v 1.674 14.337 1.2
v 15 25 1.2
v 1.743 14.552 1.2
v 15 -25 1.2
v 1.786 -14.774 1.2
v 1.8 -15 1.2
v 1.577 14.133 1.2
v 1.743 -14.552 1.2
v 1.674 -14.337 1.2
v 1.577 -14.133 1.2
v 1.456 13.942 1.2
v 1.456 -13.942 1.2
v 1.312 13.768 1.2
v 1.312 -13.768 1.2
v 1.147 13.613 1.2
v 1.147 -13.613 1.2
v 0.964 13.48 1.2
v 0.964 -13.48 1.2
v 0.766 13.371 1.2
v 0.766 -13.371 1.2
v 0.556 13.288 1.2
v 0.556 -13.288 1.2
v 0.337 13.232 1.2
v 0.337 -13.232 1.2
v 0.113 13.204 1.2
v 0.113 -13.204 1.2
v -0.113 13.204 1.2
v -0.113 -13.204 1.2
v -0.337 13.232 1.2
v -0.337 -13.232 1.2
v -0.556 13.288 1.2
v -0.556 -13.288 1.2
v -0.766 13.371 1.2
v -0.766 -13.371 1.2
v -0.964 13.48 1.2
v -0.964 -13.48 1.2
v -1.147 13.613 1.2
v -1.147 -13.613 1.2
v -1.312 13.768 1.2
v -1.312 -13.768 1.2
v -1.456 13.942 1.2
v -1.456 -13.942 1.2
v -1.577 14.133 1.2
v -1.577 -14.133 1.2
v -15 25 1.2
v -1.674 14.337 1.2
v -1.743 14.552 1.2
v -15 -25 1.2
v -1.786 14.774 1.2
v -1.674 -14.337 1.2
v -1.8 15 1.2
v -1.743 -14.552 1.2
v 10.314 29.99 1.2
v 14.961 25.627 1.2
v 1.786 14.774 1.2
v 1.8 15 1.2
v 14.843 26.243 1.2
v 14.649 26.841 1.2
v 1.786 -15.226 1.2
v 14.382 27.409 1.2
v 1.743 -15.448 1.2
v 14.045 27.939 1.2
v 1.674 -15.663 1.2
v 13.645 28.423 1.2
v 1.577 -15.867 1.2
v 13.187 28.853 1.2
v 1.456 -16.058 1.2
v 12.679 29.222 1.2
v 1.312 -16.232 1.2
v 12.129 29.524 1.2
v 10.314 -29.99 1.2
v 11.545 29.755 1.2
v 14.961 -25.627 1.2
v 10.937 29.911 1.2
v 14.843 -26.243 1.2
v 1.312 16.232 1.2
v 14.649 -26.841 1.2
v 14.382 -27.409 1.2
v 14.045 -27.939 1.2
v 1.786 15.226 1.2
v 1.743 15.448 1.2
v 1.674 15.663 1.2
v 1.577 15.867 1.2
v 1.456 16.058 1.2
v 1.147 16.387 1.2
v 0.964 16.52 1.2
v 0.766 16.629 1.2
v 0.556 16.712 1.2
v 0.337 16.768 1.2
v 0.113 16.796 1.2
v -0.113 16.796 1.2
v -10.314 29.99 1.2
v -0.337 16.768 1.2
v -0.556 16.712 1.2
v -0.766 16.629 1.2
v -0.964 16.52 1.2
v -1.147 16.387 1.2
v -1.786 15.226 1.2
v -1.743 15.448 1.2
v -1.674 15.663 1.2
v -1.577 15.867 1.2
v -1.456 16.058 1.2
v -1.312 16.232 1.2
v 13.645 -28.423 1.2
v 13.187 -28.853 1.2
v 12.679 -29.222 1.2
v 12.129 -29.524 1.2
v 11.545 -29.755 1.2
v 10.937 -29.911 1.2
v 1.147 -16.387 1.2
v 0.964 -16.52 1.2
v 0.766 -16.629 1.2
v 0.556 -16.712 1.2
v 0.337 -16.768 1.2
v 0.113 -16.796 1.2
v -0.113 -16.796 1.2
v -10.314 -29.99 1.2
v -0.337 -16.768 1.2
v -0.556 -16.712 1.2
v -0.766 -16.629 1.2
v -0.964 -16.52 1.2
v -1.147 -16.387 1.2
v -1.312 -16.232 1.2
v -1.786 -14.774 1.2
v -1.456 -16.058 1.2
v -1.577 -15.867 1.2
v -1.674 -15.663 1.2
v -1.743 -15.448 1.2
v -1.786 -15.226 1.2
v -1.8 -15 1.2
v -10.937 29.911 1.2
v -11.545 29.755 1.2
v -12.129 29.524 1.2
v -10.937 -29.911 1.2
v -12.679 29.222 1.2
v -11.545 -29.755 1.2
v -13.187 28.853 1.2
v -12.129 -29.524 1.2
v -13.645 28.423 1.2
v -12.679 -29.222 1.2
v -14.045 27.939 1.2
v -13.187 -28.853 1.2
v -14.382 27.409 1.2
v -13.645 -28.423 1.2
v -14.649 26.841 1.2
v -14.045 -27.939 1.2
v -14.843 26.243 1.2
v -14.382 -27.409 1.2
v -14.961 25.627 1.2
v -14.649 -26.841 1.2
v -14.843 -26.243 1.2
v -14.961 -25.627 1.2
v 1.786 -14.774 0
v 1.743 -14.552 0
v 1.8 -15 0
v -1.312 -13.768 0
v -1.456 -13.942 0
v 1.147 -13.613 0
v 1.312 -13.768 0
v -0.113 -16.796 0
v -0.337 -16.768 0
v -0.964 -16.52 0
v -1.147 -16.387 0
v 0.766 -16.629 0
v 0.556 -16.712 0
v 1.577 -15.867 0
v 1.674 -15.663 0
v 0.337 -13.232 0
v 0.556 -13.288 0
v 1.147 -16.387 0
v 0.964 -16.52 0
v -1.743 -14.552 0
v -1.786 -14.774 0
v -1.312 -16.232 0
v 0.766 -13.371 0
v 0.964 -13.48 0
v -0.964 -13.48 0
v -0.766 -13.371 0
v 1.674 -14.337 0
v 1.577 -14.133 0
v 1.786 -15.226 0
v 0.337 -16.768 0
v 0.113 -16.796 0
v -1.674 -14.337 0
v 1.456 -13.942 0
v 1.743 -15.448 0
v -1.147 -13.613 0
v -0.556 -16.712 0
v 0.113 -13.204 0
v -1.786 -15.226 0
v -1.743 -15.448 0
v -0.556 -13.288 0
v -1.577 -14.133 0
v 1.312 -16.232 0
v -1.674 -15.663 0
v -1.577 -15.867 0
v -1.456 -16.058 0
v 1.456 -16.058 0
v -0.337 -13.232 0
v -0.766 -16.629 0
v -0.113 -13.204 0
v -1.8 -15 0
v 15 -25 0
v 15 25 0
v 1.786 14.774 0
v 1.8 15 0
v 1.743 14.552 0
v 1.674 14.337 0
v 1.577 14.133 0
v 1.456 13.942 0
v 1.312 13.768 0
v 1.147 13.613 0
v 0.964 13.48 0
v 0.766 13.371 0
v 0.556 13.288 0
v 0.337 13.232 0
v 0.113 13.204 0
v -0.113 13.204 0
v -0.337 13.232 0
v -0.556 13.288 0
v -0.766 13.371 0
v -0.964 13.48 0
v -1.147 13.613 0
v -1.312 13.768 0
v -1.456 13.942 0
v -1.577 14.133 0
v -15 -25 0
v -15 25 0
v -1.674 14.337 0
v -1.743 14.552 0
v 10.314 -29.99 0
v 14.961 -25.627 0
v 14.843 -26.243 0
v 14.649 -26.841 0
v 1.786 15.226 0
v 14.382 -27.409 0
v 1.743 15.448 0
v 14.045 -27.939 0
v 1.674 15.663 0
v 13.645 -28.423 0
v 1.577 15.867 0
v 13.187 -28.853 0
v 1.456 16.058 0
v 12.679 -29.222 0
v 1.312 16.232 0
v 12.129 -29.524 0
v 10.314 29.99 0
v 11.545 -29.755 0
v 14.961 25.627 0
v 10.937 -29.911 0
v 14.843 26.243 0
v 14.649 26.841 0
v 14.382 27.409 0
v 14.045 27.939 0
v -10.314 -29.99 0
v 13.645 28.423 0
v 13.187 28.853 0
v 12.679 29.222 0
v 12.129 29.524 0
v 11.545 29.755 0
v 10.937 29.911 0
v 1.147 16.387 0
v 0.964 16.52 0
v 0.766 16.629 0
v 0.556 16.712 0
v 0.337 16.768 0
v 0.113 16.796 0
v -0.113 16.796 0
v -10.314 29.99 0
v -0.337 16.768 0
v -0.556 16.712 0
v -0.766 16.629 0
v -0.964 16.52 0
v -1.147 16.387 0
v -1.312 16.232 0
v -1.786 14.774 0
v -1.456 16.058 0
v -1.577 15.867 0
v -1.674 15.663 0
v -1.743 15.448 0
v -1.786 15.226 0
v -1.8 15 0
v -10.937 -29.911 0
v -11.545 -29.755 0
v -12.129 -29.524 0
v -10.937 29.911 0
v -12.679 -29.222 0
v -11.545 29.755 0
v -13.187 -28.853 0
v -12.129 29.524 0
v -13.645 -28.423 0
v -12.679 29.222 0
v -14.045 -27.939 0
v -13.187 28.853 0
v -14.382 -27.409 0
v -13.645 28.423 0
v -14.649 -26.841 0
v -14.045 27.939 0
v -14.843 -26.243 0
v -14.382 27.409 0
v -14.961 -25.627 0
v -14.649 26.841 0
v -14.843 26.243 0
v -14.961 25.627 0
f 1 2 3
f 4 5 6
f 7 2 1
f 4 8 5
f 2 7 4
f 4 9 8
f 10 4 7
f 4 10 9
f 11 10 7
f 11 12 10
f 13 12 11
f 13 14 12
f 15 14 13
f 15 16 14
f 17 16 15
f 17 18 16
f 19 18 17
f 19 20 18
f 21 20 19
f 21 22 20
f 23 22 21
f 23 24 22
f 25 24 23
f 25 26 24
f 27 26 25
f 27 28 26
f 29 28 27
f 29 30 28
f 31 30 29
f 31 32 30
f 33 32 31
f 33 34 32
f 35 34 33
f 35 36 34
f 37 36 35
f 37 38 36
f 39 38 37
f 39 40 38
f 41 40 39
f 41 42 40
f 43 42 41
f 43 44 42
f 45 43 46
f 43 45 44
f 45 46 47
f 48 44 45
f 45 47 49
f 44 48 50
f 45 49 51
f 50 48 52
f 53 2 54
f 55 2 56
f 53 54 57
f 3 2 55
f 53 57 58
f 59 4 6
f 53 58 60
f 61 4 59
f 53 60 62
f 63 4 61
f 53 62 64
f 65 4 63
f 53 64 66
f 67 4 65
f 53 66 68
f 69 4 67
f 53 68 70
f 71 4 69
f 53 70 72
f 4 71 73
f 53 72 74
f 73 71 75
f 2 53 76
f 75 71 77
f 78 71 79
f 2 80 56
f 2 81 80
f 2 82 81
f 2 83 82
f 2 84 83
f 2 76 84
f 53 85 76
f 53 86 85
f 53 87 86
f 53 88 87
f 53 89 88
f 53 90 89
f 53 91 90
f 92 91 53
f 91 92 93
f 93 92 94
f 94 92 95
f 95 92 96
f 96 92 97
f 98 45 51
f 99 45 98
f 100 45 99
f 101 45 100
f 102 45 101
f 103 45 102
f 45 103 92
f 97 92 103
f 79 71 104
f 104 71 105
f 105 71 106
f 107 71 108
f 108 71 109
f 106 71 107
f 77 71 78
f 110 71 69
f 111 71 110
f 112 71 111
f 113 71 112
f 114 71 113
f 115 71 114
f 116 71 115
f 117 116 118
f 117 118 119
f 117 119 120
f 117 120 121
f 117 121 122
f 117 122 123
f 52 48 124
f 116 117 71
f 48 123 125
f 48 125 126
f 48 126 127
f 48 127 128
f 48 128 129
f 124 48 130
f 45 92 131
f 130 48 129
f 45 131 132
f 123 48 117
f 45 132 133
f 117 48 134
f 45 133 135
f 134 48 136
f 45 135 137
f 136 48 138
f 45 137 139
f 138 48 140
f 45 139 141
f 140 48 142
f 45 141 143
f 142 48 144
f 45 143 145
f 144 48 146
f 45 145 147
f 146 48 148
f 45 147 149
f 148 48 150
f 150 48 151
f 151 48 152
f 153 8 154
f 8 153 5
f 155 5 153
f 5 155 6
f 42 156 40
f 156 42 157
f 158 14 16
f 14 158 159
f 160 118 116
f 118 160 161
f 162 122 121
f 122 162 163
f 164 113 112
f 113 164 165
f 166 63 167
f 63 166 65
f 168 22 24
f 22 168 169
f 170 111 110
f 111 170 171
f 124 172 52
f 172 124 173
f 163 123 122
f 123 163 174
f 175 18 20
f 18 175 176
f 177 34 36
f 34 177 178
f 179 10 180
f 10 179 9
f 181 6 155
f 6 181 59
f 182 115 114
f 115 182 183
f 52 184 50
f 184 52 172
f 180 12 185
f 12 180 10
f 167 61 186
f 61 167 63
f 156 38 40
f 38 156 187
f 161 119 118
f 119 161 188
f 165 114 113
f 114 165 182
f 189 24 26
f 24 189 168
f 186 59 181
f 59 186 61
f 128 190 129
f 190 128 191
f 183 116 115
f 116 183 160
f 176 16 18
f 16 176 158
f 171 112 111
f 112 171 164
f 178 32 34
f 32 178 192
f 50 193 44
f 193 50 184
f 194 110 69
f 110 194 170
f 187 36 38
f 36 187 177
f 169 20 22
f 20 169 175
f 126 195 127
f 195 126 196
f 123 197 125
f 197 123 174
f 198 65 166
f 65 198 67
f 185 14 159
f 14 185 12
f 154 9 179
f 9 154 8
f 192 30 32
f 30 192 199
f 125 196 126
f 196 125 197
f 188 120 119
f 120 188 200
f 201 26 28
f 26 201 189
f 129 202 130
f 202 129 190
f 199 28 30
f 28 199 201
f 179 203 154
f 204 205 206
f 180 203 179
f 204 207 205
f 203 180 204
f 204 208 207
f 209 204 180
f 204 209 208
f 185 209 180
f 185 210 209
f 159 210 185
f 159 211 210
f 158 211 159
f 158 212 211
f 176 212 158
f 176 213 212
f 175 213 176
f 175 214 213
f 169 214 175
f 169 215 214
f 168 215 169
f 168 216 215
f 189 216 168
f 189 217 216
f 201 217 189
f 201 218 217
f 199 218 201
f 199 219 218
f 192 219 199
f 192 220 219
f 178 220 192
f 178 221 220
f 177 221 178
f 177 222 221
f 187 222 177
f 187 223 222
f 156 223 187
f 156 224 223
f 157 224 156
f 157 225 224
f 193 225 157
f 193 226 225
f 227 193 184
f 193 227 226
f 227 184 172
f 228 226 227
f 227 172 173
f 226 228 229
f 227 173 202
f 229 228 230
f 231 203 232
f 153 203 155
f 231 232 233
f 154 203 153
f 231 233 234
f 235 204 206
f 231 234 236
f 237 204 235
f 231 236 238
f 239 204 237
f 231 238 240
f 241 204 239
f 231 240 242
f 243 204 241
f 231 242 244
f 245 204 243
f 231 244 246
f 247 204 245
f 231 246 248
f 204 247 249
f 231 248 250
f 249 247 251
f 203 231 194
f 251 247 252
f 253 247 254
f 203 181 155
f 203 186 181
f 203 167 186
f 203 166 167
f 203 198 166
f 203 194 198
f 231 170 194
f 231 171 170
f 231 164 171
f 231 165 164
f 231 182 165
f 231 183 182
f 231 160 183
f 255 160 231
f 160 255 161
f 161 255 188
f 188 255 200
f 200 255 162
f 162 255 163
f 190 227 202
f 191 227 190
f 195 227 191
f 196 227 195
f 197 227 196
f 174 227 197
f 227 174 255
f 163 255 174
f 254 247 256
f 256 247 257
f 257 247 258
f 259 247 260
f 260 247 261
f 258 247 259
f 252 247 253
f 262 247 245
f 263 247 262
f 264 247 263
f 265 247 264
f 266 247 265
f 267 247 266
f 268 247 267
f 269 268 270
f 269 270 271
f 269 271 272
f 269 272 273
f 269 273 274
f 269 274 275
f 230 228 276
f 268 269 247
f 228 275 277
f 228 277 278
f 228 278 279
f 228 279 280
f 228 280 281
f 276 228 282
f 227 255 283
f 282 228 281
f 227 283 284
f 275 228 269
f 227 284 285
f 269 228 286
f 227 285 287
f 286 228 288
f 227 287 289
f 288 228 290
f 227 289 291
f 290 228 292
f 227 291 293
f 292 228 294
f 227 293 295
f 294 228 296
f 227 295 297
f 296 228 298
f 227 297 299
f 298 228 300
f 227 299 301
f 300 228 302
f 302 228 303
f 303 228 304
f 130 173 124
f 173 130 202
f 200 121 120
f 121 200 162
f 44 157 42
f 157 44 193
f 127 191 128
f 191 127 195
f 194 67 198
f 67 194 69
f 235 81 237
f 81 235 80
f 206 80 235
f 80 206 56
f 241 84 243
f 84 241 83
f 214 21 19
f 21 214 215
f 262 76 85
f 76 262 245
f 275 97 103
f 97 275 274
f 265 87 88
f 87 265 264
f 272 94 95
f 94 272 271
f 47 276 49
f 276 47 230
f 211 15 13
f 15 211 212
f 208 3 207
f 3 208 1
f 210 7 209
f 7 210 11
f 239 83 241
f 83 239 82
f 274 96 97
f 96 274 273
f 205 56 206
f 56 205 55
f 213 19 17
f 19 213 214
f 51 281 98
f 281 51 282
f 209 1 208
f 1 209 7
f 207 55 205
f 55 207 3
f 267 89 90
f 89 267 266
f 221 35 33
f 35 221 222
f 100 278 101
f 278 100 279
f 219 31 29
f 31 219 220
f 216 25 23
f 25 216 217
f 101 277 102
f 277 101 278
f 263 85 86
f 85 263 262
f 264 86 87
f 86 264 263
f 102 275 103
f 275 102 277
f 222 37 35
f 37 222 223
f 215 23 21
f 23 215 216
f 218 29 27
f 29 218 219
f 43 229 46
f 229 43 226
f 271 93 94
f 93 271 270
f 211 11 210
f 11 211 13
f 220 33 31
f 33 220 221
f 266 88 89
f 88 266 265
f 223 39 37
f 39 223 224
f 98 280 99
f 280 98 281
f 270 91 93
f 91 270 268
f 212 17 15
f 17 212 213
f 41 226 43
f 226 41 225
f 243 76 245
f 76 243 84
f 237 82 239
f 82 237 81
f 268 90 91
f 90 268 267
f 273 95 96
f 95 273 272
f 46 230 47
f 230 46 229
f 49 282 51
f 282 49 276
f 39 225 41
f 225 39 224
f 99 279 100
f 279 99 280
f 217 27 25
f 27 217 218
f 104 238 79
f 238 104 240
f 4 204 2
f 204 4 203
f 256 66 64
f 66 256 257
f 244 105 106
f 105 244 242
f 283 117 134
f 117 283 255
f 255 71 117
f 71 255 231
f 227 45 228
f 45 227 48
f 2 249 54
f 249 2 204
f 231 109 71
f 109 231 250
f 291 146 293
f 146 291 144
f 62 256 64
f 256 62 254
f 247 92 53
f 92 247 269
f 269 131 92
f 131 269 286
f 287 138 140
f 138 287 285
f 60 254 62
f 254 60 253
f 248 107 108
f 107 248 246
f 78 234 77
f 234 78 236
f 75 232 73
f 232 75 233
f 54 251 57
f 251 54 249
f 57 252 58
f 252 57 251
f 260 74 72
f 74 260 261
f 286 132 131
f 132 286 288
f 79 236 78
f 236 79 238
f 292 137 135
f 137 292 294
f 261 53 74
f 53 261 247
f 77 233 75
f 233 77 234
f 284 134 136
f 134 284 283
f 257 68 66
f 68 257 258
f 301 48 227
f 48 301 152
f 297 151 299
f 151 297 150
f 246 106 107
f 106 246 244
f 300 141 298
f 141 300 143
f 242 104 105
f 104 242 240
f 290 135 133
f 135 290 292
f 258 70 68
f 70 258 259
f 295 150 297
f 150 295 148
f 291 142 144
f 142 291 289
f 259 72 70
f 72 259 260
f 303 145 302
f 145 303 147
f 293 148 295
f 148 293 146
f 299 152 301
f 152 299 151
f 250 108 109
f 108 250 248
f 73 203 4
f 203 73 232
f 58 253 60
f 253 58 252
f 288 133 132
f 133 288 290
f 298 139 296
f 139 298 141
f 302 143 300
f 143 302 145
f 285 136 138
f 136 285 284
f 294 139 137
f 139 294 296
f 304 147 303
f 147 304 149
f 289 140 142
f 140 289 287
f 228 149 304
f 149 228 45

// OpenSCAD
$fn = 50;


difference() {
	union() {
		hull() {
			translate(v = [-10.0000000000, 25.0000000000, 0]) {
				cylinder(h = 99, r = 5);
			}
			translate(v = [10.0000000000, 25.0000000000, 0]) {
				cylinder(h = 99, r = 5);
			}
			translate(v = [-10.0000000000, -25.0000000000, 0]) {
				cylinder(h = 99, r = 5);
			}
			translate(v = [10.0000000000, -25.0000000000, 0]) {
				cylinder(h = 99, r = 5);
			}
		}
	}
	union() {
		translate(v = [0, 0, 1.2000000000]) {
			hull() {
				translate(v = [-10.0000000000, 25.0000000000, 0]) {
					cylinder(h = 97.8000000000, r = 3.8000000000);
				}
				translate(v = [10.0000000000, 25.0000000000, 0]) {
					cylinder(h = 97.8000000000, r = 3.8000000000);
				}
				translate(v = [-10.0000000000, -25.0000000000, 0]) {
					cylinder(h = 97.8000000000, r = 3.8000000000);
				}
				translate(v = [10.0000000000, -25.0000000000, 0]) {
					cylinder(h = 97.8000000000, r = 3.8000000000);
				}
			}
		}
		#translate(v = [0.0000000000, -15.0000000000, 0]) {
			cylinder(h = 1.2000000000, r = 1.8000000000);
		}
		#translate(v = [0.0000000000, 15.0000000000, 0]) {
			cylinder(h = 1.2000000000, r = 1.8000000000);
		}
		translate(v = [-250.0000000000, -250.0000000000, 1.2000000000]) {
			cube(size = [500, 500, 500]);
		}
		translate(v = [-250.0000000000, -250.0000000000, 1.2000000000]) {
			cube(size = [500, 500, 500]);
		}
		translate(v = [-250.0000000000, -250.0000000000, 1.2000000000]) {
			cube(size = [500, 500, 500]);
		}
	}
}
